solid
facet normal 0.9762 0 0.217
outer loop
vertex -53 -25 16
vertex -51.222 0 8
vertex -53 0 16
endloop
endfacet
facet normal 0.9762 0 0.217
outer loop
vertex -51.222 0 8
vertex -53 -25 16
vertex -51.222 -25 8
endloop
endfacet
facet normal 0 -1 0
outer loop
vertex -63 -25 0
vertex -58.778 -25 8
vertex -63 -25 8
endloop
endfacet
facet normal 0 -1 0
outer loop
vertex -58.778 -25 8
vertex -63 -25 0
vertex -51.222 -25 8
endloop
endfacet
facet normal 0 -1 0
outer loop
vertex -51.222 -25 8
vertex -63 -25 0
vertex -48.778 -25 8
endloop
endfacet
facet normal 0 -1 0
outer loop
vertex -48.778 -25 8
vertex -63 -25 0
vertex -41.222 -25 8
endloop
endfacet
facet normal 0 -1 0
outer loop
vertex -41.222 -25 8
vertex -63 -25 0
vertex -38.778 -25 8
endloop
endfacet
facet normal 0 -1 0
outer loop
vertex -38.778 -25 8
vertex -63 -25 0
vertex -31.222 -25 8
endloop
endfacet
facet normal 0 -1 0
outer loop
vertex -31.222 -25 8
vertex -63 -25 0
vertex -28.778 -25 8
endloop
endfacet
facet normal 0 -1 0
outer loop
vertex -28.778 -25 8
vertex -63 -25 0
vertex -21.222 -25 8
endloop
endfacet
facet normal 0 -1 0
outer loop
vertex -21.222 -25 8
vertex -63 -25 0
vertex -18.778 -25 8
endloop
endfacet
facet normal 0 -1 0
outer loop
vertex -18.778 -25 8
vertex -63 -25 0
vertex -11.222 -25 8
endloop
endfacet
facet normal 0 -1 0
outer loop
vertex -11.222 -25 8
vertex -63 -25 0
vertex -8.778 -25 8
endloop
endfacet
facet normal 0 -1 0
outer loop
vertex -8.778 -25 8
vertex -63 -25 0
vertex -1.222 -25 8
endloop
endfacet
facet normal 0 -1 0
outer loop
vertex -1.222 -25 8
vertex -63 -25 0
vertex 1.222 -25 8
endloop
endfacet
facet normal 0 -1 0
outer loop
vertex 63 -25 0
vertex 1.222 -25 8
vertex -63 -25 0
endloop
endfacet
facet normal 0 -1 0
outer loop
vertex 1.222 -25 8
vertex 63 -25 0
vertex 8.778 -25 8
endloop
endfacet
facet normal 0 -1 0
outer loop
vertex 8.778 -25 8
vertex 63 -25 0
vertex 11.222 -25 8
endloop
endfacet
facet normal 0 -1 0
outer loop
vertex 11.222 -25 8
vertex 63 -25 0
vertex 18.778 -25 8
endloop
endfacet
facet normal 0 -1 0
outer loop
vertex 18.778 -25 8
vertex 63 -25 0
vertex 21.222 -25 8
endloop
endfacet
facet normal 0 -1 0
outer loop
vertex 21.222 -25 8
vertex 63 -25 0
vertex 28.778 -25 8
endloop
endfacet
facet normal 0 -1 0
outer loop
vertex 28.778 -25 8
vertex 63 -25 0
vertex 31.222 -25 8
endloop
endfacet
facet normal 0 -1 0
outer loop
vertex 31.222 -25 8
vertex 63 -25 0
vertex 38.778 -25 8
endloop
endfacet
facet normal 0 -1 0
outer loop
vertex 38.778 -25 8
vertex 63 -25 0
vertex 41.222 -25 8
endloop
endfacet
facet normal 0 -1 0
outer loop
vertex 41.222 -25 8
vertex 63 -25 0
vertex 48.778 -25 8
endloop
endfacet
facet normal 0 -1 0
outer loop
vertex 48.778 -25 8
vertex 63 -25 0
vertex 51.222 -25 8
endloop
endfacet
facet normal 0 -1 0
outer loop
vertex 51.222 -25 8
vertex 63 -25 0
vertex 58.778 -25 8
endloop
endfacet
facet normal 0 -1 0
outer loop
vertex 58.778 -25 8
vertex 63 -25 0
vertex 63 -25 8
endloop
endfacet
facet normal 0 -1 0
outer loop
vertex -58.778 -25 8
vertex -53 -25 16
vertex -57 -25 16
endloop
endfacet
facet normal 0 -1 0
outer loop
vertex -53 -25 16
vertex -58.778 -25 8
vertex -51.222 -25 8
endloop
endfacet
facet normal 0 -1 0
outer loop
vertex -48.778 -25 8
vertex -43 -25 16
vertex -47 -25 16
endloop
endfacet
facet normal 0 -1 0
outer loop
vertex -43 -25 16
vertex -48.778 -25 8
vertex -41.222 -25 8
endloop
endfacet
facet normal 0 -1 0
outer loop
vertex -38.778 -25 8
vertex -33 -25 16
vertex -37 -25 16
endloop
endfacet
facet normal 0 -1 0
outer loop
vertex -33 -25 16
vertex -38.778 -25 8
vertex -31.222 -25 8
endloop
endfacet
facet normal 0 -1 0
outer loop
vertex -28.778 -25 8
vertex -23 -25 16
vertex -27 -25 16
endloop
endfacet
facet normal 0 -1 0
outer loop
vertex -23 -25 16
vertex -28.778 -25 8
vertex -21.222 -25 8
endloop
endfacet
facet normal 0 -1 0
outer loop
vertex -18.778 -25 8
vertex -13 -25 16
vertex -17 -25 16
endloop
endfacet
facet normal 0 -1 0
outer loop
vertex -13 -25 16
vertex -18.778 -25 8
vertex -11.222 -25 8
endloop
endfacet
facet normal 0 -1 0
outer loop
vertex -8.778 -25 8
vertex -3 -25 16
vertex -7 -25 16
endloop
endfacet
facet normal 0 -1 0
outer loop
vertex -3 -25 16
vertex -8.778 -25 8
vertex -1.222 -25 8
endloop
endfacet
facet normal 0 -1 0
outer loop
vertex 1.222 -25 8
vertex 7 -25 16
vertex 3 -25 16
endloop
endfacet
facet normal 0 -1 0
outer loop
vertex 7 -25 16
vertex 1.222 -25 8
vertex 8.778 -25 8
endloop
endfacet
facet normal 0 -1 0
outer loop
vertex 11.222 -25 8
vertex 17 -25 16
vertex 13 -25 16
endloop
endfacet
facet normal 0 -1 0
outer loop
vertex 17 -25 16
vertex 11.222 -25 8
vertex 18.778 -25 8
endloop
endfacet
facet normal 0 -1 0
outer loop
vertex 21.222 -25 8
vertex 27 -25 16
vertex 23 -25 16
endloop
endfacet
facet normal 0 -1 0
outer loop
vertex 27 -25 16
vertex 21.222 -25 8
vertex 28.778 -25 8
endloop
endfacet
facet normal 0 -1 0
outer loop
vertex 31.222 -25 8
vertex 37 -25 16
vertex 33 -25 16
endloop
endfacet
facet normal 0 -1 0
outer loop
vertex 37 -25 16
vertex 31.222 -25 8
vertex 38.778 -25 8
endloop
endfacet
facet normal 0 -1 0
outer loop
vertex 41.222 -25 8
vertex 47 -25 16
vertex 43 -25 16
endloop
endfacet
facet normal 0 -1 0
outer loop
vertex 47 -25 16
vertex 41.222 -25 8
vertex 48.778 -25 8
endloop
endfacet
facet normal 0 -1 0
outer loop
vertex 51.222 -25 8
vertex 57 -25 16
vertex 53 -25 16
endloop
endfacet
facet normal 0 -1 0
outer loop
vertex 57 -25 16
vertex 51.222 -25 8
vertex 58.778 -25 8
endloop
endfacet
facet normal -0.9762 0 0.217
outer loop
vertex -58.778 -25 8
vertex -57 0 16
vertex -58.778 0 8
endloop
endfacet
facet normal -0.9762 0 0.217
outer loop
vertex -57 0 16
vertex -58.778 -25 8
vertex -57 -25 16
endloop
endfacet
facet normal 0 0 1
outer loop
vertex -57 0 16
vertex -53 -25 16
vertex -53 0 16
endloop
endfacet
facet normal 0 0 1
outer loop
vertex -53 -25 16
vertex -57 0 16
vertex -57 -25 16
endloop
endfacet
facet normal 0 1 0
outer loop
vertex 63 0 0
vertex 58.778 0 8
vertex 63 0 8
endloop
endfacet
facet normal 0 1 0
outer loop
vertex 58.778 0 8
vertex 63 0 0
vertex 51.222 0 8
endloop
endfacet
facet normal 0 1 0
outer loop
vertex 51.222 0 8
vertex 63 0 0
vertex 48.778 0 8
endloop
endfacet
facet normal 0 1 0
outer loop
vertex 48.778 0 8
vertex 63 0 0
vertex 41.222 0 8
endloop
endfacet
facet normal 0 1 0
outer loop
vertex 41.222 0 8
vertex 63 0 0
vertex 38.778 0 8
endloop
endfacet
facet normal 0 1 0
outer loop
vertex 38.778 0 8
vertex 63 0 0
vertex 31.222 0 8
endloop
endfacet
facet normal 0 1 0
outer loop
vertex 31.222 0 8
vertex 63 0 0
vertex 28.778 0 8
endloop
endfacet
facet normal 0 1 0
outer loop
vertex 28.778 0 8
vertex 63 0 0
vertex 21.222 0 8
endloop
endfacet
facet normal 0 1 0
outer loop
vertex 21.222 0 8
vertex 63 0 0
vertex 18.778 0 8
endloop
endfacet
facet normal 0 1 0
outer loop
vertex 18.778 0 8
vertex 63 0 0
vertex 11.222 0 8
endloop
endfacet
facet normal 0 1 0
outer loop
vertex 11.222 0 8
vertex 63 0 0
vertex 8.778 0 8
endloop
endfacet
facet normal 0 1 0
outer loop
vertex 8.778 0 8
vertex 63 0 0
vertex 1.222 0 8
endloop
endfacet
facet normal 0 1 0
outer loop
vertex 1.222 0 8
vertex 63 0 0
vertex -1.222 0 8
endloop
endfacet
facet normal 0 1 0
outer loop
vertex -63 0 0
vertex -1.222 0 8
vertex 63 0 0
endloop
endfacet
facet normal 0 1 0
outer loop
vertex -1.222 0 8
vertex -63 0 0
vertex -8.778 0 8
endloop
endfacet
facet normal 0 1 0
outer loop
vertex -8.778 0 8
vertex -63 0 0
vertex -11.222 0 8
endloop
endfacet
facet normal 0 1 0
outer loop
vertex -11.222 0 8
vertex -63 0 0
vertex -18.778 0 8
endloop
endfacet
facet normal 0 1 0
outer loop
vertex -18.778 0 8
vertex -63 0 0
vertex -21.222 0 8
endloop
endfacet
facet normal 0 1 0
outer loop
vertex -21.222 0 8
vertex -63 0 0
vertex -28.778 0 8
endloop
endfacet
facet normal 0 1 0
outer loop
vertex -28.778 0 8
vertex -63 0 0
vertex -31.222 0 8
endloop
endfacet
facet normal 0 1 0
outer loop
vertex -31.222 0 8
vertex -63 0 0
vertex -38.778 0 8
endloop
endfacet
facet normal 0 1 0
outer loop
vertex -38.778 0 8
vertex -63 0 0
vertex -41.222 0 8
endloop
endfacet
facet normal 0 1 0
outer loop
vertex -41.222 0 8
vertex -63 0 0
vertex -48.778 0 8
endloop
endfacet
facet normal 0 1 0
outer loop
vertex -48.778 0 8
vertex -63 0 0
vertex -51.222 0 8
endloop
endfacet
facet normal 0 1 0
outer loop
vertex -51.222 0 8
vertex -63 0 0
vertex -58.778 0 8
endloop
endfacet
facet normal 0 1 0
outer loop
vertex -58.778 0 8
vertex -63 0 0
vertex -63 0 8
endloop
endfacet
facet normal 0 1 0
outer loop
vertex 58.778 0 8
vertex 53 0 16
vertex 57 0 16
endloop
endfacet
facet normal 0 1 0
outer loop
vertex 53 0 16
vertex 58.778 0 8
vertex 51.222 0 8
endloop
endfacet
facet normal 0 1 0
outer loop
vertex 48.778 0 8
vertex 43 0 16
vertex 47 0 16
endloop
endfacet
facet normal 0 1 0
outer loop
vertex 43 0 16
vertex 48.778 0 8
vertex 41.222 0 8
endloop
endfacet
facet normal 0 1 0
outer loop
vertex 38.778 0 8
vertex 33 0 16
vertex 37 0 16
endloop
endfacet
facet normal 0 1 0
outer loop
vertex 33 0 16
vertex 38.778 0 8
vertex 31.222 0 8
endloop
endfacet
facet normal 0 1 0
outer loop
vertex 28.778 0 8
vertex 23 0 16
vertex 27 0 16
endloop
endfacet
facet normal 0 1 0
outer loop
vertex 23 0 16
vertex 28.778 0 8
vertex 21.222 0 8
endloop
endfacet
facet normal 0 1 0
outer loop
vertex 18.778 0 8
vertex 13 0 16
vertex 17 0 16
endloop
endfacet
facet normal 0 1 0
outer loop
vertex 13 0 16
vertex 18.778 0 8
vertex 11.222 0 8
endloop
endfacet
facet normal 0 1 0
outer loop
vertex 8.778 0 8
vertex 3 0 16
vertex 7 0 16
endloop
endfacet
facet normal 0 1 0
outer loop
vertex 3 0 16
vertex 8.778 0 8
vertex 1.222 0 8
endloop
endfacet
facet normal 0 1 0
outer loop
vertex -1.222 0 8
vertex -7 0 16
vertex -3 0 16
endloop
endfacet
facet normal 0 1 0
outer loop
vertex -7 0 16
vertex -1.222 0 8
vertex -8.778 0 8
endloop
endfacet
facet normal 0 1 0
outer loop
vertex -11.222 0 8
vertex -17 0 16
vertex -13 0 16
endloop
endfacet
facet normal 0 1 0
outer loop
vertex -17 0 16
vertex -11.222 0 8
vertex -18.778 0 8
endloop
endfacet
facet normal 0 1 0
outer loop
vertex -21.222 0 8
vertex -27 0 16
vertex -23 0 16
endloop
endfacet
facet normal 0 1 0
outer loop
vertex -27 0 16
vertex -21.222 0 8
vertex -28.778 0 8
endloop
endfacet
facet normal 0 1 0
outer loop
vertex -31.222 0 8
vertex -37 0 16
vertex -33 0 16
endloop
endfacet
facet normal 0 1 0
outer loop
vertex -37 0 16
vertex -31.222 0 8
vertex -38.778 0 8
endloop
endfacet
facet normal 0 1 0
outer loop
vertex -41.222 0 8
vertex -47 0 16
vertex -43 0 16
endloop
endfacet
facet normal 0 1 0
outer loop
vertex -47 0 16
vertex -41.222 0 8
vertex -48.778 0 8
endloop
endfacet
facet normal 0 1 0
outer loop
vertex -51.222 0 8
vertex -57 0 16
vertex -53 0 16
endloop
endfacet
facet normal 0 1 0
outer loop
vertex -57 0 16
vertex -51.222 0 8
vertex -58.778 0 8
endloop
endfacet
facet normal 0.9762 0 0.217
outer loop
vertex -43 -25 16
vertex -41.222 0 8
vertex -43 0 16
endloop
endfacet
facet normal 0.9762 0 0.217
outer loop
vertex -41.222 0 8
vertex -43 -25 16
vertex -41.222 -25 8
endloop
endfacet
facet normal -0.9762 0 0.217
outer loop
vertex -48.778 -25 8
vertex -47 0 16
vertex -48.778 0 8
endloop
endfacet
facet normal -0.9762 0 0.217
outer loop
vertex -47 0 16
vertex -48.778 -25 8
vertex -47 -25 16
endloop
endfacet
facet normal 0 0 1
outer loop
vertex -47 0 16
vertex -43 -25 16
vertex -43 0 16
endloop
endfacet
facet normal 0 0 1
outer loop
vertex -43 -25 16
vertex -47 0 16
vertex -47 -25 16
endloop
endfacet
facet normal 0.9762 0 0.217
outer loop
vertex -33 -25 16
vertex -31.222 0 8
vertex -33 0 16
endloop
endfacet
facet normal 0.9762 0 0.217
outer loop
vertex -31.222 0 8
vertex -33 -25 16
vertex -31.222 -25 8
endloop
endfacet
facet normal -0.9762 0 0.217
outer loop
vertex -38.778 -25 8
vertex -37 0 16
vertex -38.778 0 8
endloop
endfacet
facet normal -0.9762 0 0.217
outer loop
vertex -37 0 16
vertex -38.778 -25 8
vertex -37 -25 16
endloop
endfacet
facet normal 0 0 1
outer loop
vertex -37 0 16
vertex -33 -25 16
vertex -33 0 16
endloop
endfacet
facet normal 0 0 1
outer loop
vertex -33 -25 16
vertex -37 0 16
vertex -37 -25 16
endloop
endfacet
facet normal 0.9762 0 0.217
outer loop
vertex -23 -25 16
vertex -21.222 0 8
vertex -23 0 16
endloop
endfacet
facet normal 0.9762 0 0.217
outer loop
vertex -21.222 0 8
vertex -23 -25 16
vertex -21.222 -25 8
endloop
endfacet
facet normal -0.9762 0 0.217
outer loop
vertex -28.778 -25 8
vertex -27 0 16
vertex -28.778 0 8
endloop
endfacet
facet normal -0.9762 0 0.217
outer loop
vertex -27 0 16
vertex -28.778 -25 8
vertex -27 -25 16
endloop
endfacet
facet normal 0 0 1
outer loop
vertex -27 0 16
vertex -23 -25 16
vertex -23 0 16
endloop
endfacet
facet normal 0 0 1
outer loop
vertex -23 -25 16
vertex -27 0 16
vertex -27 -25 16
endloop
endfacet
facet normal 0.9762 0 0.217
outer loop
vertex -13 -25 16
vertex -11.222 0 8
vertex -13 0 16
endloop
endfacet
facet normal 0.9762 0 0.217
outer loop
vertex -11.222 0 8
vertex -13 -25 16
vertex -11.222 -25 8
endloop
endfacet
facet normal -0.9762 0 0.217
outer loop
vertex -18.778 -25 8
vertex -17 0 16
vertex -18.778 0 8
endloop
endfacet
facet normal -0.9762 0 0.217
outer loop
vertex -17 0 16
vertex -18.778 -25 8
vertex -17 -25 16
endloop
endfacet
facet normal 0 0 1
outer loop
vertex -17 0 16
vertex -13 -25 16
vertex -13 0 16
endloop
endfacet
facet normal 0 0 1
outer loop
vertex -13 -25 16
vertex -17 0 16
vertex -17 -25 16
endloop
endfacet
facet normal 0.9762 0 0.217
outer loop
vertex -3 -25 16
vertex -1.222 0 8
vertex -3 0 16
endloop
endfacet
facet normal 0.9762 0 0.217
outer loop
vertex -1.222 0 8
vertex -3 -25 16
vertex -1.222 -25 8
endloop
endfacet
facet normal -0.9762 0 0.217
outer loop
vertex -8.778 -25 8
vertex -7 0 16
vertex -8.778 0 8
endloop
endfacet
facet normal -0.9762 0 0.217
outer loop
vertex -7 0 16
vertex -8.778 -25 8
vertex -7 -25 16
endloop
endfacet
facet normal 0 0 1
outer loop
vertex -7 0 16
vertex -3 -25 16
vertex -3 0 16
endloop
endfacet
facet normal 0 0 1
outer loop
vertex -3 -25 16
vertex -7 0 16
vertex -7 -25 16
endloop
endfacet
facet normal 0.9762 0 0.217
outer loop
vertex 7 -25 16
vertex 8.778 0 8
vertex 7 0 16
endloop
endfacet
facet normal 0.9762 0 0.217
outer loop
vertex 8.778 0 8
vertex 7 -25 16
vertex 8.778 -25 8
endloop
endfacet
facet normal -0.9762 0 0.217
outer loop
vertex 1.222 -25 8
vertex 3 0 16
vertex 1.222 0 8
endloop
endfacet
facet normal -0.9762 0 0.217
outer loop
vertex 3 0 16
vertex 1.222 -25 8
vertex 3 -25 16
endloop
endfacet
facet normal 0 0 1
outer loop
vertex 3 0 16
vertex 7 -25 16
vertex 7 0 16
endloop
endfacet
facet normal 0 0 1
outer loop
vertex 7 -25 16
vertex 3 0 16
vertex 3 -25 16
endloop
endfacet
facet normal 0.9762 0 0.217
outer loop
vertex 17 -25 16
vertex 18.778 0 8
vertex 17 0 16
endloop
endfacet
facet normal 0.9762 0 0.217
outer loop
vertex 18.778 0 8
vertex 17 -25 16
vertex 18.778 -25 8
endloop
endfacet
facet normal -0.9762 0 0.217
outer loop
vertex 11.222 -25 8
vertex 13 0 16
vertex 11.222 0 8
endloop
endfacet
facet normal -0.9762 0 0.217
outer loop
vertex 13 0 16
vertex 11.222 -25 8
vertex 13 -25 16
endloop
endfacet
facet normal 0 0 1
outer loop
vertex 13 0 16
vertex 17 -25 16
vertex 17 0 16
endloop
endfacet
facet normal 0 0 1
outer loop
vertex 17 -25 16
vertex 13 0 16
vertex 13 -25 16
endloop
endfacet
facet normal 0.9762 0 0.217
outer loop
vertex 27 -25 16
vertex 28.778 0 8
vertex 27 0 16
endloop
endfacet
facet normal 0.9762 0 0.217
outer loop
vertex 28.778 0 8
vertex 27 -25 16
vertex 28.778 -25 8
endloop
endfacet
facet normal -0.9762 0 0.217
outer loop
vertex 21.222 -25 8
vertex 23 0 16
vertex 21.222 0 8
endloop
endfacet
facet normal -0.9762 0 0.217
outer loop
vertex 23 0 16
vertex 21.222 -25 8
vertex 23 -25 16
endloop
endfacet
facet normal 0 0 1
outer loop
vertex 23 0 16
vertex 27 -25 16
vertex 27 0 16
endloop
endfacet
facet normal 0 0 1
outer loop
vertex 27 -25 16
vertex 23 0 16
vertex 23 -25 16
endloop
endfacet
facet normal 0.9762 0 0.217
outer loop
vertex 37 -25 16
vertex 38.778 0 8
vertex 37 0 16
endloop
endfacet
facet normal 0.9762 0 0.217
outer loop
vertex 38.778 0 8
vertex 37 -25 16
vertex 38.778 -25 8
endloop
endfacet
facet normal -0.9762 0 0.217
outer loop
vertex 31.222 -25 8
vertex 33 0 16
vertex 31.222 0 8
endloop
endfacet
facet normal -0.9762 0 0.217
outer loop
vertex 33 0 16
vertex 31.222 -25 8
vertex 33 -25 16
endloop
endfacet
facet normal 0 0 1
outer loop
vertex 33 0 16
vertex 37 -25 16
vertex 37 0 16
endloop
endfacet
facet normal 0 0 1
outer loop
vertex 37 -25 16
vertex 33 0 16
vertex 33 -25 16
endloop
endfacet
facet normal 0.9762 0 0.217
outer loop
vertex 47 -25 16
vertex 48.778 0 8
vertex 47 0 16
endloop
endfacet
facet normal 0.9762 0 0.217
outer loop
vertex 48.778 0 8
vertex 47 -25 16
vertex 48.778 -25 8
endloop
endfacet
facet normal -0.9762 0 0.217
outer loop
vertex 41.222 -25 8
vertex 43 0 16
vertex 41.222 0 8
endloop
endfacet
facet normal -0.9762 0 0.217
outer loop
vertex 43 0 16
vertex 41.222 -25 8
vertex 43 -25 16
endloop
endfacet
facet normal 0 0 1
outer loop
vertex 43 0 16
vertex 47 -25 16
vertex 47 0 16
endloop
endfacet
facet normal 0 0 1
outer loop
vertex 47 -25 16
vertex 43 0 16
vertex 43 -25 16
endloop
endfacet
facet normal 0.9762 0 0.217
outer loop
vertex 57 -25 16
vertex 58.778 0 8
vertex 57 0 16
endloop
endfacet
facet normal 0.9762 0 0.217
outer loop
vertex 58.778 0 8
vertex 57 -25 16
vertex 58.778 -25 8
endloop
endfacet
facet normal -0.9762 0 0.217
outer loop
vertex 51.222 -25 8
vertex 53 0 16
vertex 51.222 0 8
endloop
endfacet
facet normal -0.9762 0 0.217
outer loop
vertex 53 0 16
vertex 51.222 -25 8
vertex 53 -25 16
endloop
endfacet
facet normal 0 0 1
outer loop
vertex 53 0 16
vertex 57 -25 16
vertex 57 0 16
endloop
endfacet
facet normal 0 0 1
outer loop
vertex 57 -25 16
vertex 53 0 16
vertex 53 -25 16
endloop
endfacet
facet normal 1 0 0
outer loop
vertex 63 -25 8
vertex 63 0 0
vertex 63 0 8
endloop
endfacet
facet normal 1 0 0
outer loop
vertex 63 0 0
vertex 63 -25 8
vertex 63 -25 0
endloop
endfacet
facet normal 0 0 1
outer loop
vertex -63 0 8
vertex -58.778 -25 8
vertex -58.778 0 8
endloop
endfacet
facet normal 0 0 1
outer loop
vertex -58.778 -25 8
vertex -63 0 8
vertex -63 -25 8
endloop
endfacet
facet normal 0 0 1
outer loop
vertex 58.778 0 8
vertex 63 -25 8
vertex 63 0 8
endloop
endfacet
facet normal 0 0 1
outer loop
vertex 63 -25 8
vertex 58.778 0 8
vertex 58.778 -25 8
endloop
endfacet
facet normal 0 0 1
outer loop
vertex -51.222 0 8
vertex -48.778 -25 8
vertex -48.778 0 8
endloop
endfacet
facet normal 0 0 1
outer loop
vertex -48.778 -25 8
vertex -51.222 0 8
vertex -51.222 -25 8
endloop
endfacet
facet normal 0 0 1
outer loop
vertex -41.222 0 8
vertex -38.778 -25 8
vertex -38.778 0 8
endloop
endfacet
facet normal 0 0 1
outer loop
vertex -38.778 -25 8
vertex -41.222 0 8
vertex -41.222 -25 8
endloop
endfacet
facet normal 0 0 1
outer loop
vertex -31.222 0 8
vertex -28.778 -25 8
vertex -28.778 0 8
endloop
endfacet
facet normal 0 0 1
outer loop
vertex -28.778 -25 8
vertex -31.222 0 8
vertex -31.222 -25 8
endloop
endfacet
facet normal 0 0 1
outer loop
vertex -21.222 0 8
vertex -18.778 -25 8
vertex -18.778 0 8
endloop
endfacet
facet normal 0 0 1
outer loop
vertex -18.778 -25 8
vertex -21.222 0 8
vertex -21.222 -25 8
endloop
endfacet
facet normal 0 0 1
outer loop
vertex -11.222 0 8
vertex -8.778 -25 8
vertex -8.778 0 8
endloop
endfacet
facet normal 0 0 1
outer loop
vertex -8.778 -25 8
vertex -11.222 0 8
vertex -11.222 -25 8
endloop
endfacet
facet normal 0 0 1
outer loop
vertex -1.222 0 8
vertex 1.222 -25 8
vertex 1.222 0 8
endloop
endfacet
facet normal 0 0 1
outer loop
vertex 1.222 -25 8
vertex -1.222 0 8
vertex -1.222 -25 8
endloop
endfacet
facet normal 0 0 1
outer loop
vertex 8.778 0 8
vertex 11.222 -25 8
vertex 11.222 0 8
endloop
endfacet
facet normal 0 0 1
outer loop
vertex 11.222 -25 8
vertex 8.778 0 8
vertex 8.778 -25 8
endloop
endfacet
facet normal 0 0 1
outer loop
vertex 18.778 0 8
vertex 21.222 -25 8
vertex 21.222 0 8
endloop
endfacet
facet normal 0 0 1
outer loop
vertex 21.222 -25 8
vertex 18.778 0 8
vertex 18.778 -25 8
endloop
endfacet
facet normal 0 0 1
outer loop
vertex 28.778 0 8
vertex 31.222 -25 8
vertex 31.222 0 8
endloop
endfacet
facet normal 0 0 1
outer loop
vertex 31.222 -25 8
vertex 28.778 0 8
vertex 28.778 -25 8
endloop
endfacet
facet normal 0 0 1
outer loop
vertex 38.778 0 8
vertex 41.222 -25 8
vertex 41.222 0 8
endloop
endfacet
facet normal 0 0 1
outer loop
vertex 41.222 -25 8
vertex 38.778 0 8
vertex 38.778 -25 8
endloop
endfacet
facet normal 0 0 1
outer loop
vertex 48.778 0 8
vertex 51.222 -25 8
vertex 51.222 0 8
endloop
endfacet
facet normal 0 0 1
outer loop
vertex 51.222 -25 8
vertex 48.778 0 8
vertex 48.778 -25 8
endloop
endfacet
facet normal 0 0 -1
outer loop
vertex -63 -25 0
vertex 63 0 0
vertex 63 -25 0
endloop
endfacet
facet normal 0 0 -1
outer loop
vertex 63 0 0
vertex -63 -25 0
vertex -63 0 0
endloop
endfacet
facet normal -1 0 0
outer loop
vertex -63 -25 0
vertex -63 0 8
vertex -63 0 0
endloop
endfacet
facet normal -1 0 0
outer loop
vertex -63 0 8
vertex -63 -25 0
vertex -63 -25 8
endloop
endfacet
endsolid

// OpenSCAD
$fn = 32;

// ----------------------------------------------------------------------
// Toothed rack, 12 teeth
// 10 mm pitch, 8 mm teeth
// ----------------------------------------------------------------------

// --- parameters (mm) ---
bar_w = 25;   // bar width (Y)
bar_h = 8;    // bar height (Z)
teeth = 12;   // number of teeth
pitch = 10;   // tooth pitch
tooth_h = 8;  // tooth height above the bar
root_w = 8;   // tooth width at the root
crest_w = 4;  // tooth width at the crest

// --- derived feature positions (mm) ---
span = (teeth - 1) * pitch;  // = 110   distance between the outer teeth
bar_l = span + root_w + 8;   // = 126   bar length: teeth plus 4 mm at each end
tooth_x = -span / 2;         // = -55   X of the first tooth
height = bar_h + tooth_h;    // = 16   overall height
feature_centers = [
  [tooth_x + 0 * pitch, -bar_w / 2],
  [tooth_x + 1 * pitch, -bar_w / 2],
  [tooth_x + 2 * pitch, -bar_w / 2],
  [tooth_x + 3 * pitch, -bar_w / 2],
  [tooth_x + 4 * pitch, -bar_w / 2],
  [tooth_x + 5 * pitch, -bar_w / 2],
  [tooth_x + 6 * pitch, -bar_w / 2],
  [tooth_x + 7 * pitch, -bar_w / 2],
  [tooth_x + 8 * pitch, -bar_w / 2],
  [tooth_x + 9 * pitch, -bar_w / 2],
  [tooth_x + 10 * pitch, -bar_w / 2],
  [tooth_x + 11 * pitch, -bar_w / 2]
];   // tooth centre line, drives the tooth loop

// bar with a rack of teeth, one extruded trapezoium per centre
module rack_tooth() {
  linear_extrude(height = bar_w)
    polygon(points = [
      [0, 0],
      [root_w, 0],
      [root_w / 2 + crest_w / 2, tooth_h + 1],
      [root_w / 2 - crest_w / 2, tooth_h + 1]
    ]);
}

union() {
  translate([-bar_l / 2, -bar_w, 0]) cube([bar_l, bar_w, bar_h]);
  for (centre = feature_centers)
    translate([centre[0] - root_w / 2, 0, bar_h - 1]) rotate([90, 0, 0]) rack_tooth();
}
